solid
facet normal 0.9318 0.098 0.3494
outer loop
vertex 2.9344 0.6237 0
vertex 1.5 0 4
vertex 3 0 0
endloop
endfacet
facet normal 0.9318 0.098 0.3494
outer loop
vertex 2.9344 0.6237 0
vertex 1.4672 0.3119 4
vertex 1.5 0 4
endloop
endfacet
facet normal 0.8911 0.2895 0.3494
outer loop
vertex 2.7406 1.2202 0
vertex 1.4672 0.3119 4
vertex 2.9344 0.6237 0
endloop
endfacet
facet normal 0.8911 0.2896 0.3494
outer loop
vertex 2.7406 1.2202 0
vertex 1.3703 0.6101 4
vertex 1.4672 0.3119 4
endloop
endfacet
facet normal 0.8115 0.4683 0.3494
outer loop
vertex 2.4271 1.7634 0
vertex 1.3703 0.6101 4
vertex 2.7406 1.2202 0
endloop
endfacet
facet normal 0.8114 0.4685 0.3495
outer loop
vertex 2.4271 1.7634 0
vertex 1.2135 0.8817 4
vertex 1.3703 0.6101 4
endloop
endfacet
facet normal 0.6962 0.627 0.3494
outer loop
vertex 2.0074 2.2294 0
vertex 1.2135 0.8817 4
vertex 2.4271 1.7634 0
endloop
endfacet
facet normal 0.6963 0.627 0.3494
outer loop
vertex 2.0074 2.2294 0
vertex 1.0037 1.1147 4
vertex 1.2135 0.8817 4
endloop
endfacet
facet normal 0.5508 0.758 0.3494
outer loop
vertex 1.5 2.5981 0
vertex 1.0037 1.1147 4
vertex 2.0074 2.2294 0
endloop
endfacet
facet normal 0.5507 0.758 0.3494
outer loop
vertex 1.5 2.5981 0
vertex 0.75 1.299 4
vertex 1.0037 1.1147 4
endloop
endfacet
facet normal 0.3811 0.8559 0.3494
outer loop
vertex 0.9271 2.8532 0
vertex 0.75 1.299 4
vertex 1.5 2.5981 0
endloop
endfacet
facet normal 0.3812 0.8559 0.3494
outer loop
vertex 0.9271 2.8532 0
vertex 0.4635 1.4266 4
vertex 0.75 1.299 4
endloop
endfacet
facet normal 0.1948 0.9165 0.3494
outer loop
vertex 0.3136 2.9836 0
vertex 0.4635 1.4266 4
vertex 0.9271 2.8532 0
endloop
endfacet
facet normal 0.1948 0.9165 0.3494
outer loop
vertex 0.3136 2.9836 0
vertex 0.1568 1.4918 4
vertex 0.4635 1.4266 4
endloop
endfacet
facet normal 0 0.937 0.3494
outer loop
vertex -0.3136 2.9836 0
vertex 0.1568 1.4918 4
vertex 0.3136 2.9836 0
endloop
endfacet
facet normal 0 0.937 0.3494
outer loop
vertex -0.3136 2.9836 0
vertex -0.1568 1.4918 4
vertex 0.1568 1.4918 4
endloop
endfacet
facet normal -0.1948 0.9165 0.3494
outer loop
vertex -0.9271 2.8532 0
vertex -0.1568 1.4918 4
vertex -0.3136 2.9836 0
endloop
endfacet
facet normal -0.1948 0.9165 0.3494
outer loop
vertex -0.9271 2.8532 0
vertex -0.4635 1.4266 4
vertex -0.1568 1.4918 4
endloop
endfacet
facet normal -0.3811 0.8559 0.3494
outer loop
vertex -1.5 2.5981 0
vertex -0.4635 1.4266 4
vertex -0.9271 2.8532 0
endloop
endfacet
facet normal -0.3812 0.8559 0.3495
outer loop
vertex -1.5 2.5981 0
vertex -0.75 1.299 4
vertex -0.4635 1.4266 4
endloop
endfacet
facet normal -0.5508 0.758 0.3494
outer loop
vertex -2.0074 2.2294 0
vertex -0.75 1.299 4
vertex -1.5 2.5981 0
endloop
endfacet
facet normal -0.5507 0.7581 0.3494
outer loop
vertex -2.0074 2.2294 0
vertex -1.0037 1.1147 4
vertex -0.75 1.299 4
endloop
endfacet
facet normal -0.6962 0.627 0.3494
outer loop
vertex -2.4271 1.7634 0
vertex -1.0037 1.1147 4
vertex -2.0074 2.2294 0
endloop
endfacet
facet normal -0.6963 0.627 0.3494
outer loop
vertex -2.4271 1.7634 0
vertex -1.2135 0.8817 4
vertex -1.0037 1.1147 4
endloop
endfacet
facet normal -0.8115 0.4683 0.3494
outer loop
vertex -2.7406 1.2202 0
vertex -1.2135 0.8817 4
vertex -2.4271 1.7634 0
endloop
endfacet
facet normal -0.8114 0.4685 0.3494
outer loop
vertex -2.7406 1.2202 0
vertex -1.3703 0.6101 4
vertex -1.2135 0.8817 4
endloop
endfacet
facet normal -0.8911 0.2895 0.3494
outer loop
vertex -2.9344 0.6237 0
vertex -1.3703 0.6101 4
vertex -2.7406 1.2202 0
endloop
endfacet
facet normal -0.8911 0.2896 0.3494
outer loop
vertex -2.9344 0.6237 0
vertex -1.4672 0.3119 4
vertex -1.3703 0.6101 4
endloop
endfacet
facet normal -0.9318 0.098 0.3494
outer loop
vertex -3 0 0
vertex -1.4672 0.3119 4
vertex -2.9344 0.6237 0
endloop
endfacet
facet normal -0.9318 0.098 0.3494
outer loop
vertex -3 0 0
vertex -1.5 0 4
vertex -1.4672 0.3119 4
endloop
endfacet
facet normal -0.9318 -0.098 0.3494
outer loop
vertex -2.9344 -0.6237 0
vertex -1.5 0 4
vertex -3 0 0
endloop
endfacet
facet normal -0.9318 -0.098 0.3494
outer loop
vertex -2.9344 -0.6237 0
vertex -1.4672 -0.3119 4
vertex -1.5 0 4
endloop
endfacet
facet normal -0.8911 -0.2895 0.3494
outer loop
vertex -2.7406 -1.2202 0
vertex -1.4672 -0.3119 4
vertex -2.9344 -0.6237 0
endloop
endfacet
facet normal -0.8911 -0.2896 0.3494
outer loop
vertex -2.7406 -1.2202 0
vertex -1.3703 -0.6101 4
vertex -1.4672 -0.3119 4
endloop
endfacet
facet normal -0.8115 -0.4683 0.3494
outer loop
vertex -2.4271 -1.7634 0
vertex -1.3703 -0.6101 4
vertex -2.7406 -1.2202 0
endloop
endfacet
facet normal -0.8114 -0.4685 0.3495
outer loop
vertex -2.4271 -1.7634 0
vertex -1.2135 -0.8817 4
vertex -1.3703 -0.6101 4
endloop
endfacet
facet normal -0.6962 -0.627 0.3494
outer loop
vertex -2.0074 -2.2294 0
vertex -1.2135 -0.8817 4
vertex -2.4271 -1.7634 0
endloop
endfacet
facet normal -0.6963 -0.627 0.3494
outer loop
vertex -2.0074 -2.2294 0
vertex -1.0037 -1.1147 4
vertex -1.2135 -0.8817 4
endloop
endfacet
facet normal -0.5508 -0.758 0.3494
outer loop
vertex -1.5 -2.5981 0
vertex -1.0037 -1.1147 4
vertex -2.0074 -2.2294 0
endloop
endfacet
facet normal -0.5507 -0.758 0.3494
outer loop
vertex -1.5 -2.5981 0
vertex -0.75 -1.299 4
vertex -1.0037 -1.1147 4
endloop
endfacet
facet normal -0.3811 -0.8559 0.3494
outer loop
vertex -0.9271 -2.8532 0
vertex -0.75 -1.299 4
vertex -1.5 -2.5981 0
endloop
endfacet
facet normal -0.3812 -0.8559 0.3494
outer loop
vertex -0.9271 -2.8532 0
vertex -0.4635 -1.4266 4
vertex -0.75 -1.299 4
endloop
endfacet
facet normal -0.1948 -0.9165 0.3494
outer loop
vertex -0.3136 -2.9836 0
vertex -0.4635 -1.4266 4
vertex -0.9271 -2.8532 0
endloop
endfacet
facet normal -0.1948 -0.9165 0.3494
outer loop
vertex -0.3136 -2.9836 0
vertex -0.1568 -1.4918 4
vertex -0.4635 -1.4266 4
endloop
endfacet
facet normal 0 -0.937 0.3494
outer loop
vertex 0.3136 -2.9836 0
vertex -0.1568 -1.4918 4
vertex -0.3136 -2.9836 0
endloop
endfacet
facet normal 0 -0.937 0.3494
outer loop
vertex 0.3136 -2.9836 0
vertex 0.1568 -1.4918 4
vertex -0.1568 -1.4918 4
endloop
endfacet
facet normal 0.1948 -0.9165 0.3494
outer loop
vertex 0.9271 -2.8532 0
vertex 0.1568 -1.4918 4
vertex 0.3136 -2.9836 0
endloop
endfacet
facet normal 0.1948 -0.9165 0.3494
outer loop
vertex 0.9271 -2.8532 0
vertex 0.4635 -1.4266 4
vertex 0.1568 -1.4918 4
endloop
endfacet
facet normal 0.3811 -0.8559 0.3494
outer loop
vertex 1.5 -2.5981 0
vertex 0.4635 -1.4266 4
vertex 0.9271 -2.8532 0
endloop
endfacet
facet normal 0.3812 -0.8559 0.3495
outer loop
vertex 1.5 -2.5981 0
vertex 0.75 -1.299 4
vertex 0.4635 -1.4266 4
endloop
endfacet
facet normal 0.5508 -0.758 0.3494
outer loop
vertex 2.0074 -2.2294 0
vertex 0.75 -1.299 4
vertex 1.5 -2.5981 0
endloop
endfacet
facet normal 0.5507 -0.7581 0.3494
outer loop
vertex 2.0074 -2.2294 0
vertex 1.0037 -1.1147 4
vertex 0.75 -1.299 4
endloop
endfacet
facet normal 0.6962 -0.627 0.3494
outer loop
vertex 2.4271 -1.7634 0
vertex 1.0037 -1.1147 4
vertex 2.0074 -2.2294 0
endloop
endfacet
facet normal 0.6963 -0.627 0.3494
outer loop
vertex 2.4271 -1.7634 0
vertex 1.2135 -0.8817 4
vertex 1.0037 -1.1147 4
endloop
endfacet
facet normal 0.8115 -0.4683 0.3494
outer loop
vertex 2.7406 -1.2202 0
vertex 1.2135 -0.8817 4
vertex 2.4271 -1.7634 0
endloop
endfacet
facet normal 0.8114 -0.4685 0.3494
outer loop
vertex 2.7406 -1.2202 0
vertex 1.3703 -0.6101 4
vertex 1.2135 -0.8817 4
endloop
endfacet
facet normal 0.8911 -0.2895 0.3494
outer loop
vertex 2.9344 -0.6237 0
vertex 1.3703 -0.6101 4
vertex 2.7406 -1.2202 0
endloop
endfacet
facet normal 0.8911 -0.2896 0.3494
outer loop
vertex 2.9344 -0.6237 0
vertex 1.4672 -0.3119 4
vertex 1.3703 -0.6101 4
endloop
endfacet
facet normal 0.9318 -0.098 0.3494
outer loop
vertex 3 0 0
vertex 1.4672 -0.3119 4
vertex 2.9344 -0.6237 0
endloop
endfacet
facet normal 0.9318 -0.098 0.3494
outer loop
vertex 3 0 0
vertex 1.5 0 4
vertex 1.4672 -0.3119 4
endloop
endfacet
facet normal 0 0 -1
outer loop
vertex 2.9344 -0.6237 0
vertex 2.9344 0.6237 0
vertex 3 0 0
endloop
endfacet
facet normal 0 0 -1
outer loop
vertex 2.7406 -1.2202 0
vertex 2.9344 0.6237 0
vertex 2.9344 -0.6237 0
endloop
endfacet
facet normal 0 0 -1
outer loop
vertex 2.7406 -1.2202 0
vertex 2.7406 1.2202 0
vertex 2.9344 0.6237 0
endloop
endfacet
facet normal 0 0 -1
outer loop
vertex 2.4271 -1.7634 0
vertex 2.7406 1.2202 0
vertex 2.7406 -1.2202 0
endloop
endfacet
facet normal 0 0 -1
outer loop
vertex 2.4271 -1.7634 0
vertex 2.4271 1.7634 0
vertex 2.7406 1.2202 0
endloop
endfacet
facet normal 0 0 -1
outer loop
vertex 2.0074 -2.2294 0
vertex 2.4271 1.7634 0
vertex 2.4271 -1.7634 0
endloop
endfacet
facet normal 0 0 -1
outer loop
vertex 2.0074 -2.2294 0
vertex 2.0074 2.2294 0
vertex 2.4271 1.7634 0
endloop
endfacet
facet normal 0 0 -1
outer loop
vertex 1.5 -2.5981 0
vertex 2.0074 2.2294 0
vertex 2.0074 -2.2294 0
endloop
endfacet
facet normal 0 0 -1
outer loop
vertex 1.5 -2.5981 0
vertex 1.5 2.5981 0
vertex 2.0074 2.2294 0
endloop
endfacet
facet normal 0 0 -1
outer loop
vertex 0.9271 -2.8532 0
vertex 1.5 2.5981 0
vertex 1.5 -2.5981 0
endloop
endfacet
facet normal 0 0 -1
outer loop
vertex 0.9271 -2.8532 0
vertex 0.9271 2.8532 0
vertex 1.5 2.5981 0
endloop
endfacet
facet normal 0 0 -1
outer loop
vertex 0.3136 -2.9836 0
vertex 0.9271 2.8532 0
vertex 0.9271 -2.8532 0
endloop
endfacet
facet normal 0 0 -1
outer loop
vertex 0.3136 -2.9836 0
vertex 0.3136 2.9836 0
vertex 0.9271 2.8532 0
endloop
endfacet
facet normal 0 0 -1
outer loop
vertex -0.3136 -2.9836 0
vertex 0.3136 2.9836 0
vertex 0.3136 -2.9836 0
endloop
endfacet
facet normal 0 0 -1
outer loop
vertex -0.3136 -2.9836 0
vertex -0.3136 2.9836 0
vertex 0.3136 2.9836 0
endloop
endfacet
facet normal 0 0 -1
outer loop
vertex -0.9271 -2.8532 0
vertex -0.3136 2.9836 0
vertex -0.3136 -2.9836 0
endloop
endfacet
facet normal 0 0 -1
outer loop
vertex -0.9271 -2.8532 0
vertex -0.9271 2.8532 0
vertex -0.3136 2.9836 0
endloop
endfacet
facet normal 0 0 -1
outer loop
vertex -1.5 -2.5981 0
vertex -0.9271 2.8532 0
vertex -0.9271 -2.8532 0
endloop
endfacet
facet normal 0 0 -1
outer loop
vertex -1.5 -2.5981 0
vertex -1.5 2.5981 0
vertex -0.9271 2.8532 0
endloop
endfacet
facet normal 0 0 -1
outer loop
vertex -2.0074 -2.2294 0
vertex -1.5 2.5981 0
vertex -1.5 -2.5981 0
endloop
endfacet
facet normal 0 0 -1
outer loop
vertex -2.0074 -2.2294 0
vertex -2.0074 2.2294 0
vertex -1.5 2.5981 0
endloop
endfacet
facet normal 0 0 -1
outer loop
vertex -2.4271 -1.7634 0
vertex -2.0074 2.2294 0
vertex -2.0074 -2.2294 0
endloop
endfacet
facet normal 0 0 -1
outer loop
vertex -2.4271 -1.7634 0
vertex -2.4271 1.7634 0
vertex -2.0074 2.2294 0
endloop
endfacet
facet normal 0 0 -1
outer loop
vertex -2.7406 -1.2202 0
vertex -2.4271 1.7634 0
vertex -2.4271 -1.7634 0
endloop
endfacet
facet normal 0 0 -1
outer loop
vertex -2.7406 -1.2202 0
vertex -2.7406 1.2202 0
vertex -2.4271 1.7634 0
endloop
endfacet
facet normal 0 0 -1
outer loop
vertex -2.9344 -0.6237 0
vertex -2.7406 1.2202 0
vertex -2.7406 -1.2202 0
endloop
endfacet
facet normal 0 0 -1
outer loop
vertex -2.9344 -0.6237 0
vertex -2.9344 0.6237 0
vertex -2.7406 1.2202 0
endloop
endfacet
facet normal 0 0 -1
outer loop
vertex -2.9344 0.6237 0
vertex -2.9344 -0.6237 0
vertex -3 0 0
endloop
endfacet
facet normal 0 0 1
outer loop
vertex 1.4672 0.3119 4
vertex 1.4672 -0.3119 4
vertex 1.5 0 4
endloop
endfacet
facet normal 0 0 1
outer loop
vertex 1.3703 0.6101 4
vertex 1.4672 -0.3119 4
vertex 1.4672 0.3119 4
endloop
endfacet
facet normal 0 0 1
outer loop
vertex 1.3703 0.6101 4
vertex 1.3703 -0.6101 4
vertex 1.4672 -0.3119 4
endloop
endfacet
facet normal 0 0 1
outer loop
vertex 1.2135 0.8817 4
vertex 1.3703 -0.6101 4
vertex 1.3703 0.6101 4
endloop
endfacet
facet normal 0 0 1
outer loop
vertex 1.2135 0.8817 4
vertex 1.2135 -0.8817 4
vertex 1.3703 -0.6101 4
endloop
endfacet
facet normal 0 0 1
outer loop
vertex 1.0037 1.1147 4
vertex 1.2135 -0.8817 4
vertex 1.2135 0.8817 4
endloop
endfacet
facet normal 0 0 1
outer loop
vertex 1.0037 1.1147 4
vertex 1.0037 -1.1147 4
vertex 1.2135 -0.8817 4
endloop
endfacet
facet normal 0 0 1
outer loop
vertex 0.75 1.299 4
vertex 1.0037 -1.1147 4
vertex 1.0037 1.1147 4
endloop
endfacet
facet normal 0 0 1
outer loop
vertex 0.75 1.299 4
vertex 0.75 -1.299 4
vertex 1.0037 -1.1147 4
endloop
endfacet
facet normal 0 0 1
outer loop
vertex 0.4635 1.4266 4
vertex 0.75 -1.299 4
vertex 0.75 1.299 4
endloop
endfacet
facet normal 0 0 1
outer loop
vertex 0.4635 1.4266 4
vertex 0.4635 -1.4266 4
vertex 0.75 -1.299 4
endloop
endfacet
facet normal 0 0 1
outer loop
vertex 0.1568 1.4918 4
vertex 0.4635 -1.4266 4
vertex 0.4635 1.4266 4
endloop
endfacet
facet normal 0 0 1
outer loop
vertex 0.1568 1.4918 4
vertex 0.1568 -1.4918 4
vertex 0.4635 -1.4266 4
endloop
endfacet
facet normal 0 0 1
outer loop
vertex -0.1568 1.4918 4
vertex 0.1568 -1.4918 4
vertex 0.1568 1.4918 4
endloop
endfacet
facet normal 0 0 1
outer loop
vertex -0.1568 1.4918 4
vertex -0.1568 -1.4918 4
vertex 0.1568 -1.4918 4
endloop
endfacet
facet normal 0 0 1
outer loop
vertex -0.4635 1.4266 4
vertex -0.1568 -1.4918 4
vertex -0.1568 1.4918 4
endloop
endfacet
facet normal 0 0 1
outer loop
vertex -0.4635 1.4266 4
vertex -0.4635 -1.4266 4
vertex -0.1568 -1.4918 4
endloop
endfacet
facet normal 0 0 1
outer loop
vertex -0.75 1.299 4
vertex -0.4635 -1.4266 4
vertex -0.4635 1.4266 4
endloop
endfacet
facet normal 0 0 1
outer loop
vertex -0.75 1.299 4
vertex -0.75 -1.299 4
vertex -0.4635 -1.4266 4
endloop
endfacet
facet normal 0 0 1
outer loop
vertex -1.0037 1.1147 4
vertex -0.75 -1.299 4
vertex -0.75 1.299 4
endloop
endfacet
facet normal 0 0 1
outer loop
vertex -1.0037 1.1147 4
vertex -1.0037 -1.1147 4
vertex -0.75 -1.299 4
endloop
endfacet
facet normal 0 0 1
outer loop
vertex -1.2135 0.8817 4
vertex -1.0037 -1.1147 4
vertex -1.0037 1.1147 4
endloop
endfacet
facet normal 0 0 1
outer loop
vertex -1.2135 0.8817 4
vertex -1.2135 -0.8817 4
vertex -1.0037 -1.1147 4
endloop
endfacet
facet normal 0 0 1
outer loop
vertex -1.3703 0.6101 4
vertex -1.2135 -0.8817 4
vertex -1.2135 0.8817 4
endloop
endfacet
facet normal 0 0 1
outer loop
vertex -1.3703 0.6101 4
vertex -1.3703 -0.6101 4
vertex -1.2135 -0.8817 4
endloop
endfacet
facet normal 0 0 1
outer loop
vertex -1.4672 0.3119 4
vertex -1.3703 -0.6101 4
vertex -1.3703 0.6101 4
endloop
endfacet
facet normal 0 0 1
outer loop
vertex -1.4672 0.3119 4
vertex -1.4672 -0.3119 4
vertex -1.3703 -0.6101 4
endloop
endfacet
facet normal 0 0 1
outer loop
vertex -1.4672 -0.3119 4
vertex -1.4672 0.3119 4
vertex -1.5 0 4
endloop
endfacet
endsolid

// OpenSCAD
// frustum given with diameters and $fs
cylinder(h = 4, d1 = 6, d2 = 3, $fs = 0.3);
